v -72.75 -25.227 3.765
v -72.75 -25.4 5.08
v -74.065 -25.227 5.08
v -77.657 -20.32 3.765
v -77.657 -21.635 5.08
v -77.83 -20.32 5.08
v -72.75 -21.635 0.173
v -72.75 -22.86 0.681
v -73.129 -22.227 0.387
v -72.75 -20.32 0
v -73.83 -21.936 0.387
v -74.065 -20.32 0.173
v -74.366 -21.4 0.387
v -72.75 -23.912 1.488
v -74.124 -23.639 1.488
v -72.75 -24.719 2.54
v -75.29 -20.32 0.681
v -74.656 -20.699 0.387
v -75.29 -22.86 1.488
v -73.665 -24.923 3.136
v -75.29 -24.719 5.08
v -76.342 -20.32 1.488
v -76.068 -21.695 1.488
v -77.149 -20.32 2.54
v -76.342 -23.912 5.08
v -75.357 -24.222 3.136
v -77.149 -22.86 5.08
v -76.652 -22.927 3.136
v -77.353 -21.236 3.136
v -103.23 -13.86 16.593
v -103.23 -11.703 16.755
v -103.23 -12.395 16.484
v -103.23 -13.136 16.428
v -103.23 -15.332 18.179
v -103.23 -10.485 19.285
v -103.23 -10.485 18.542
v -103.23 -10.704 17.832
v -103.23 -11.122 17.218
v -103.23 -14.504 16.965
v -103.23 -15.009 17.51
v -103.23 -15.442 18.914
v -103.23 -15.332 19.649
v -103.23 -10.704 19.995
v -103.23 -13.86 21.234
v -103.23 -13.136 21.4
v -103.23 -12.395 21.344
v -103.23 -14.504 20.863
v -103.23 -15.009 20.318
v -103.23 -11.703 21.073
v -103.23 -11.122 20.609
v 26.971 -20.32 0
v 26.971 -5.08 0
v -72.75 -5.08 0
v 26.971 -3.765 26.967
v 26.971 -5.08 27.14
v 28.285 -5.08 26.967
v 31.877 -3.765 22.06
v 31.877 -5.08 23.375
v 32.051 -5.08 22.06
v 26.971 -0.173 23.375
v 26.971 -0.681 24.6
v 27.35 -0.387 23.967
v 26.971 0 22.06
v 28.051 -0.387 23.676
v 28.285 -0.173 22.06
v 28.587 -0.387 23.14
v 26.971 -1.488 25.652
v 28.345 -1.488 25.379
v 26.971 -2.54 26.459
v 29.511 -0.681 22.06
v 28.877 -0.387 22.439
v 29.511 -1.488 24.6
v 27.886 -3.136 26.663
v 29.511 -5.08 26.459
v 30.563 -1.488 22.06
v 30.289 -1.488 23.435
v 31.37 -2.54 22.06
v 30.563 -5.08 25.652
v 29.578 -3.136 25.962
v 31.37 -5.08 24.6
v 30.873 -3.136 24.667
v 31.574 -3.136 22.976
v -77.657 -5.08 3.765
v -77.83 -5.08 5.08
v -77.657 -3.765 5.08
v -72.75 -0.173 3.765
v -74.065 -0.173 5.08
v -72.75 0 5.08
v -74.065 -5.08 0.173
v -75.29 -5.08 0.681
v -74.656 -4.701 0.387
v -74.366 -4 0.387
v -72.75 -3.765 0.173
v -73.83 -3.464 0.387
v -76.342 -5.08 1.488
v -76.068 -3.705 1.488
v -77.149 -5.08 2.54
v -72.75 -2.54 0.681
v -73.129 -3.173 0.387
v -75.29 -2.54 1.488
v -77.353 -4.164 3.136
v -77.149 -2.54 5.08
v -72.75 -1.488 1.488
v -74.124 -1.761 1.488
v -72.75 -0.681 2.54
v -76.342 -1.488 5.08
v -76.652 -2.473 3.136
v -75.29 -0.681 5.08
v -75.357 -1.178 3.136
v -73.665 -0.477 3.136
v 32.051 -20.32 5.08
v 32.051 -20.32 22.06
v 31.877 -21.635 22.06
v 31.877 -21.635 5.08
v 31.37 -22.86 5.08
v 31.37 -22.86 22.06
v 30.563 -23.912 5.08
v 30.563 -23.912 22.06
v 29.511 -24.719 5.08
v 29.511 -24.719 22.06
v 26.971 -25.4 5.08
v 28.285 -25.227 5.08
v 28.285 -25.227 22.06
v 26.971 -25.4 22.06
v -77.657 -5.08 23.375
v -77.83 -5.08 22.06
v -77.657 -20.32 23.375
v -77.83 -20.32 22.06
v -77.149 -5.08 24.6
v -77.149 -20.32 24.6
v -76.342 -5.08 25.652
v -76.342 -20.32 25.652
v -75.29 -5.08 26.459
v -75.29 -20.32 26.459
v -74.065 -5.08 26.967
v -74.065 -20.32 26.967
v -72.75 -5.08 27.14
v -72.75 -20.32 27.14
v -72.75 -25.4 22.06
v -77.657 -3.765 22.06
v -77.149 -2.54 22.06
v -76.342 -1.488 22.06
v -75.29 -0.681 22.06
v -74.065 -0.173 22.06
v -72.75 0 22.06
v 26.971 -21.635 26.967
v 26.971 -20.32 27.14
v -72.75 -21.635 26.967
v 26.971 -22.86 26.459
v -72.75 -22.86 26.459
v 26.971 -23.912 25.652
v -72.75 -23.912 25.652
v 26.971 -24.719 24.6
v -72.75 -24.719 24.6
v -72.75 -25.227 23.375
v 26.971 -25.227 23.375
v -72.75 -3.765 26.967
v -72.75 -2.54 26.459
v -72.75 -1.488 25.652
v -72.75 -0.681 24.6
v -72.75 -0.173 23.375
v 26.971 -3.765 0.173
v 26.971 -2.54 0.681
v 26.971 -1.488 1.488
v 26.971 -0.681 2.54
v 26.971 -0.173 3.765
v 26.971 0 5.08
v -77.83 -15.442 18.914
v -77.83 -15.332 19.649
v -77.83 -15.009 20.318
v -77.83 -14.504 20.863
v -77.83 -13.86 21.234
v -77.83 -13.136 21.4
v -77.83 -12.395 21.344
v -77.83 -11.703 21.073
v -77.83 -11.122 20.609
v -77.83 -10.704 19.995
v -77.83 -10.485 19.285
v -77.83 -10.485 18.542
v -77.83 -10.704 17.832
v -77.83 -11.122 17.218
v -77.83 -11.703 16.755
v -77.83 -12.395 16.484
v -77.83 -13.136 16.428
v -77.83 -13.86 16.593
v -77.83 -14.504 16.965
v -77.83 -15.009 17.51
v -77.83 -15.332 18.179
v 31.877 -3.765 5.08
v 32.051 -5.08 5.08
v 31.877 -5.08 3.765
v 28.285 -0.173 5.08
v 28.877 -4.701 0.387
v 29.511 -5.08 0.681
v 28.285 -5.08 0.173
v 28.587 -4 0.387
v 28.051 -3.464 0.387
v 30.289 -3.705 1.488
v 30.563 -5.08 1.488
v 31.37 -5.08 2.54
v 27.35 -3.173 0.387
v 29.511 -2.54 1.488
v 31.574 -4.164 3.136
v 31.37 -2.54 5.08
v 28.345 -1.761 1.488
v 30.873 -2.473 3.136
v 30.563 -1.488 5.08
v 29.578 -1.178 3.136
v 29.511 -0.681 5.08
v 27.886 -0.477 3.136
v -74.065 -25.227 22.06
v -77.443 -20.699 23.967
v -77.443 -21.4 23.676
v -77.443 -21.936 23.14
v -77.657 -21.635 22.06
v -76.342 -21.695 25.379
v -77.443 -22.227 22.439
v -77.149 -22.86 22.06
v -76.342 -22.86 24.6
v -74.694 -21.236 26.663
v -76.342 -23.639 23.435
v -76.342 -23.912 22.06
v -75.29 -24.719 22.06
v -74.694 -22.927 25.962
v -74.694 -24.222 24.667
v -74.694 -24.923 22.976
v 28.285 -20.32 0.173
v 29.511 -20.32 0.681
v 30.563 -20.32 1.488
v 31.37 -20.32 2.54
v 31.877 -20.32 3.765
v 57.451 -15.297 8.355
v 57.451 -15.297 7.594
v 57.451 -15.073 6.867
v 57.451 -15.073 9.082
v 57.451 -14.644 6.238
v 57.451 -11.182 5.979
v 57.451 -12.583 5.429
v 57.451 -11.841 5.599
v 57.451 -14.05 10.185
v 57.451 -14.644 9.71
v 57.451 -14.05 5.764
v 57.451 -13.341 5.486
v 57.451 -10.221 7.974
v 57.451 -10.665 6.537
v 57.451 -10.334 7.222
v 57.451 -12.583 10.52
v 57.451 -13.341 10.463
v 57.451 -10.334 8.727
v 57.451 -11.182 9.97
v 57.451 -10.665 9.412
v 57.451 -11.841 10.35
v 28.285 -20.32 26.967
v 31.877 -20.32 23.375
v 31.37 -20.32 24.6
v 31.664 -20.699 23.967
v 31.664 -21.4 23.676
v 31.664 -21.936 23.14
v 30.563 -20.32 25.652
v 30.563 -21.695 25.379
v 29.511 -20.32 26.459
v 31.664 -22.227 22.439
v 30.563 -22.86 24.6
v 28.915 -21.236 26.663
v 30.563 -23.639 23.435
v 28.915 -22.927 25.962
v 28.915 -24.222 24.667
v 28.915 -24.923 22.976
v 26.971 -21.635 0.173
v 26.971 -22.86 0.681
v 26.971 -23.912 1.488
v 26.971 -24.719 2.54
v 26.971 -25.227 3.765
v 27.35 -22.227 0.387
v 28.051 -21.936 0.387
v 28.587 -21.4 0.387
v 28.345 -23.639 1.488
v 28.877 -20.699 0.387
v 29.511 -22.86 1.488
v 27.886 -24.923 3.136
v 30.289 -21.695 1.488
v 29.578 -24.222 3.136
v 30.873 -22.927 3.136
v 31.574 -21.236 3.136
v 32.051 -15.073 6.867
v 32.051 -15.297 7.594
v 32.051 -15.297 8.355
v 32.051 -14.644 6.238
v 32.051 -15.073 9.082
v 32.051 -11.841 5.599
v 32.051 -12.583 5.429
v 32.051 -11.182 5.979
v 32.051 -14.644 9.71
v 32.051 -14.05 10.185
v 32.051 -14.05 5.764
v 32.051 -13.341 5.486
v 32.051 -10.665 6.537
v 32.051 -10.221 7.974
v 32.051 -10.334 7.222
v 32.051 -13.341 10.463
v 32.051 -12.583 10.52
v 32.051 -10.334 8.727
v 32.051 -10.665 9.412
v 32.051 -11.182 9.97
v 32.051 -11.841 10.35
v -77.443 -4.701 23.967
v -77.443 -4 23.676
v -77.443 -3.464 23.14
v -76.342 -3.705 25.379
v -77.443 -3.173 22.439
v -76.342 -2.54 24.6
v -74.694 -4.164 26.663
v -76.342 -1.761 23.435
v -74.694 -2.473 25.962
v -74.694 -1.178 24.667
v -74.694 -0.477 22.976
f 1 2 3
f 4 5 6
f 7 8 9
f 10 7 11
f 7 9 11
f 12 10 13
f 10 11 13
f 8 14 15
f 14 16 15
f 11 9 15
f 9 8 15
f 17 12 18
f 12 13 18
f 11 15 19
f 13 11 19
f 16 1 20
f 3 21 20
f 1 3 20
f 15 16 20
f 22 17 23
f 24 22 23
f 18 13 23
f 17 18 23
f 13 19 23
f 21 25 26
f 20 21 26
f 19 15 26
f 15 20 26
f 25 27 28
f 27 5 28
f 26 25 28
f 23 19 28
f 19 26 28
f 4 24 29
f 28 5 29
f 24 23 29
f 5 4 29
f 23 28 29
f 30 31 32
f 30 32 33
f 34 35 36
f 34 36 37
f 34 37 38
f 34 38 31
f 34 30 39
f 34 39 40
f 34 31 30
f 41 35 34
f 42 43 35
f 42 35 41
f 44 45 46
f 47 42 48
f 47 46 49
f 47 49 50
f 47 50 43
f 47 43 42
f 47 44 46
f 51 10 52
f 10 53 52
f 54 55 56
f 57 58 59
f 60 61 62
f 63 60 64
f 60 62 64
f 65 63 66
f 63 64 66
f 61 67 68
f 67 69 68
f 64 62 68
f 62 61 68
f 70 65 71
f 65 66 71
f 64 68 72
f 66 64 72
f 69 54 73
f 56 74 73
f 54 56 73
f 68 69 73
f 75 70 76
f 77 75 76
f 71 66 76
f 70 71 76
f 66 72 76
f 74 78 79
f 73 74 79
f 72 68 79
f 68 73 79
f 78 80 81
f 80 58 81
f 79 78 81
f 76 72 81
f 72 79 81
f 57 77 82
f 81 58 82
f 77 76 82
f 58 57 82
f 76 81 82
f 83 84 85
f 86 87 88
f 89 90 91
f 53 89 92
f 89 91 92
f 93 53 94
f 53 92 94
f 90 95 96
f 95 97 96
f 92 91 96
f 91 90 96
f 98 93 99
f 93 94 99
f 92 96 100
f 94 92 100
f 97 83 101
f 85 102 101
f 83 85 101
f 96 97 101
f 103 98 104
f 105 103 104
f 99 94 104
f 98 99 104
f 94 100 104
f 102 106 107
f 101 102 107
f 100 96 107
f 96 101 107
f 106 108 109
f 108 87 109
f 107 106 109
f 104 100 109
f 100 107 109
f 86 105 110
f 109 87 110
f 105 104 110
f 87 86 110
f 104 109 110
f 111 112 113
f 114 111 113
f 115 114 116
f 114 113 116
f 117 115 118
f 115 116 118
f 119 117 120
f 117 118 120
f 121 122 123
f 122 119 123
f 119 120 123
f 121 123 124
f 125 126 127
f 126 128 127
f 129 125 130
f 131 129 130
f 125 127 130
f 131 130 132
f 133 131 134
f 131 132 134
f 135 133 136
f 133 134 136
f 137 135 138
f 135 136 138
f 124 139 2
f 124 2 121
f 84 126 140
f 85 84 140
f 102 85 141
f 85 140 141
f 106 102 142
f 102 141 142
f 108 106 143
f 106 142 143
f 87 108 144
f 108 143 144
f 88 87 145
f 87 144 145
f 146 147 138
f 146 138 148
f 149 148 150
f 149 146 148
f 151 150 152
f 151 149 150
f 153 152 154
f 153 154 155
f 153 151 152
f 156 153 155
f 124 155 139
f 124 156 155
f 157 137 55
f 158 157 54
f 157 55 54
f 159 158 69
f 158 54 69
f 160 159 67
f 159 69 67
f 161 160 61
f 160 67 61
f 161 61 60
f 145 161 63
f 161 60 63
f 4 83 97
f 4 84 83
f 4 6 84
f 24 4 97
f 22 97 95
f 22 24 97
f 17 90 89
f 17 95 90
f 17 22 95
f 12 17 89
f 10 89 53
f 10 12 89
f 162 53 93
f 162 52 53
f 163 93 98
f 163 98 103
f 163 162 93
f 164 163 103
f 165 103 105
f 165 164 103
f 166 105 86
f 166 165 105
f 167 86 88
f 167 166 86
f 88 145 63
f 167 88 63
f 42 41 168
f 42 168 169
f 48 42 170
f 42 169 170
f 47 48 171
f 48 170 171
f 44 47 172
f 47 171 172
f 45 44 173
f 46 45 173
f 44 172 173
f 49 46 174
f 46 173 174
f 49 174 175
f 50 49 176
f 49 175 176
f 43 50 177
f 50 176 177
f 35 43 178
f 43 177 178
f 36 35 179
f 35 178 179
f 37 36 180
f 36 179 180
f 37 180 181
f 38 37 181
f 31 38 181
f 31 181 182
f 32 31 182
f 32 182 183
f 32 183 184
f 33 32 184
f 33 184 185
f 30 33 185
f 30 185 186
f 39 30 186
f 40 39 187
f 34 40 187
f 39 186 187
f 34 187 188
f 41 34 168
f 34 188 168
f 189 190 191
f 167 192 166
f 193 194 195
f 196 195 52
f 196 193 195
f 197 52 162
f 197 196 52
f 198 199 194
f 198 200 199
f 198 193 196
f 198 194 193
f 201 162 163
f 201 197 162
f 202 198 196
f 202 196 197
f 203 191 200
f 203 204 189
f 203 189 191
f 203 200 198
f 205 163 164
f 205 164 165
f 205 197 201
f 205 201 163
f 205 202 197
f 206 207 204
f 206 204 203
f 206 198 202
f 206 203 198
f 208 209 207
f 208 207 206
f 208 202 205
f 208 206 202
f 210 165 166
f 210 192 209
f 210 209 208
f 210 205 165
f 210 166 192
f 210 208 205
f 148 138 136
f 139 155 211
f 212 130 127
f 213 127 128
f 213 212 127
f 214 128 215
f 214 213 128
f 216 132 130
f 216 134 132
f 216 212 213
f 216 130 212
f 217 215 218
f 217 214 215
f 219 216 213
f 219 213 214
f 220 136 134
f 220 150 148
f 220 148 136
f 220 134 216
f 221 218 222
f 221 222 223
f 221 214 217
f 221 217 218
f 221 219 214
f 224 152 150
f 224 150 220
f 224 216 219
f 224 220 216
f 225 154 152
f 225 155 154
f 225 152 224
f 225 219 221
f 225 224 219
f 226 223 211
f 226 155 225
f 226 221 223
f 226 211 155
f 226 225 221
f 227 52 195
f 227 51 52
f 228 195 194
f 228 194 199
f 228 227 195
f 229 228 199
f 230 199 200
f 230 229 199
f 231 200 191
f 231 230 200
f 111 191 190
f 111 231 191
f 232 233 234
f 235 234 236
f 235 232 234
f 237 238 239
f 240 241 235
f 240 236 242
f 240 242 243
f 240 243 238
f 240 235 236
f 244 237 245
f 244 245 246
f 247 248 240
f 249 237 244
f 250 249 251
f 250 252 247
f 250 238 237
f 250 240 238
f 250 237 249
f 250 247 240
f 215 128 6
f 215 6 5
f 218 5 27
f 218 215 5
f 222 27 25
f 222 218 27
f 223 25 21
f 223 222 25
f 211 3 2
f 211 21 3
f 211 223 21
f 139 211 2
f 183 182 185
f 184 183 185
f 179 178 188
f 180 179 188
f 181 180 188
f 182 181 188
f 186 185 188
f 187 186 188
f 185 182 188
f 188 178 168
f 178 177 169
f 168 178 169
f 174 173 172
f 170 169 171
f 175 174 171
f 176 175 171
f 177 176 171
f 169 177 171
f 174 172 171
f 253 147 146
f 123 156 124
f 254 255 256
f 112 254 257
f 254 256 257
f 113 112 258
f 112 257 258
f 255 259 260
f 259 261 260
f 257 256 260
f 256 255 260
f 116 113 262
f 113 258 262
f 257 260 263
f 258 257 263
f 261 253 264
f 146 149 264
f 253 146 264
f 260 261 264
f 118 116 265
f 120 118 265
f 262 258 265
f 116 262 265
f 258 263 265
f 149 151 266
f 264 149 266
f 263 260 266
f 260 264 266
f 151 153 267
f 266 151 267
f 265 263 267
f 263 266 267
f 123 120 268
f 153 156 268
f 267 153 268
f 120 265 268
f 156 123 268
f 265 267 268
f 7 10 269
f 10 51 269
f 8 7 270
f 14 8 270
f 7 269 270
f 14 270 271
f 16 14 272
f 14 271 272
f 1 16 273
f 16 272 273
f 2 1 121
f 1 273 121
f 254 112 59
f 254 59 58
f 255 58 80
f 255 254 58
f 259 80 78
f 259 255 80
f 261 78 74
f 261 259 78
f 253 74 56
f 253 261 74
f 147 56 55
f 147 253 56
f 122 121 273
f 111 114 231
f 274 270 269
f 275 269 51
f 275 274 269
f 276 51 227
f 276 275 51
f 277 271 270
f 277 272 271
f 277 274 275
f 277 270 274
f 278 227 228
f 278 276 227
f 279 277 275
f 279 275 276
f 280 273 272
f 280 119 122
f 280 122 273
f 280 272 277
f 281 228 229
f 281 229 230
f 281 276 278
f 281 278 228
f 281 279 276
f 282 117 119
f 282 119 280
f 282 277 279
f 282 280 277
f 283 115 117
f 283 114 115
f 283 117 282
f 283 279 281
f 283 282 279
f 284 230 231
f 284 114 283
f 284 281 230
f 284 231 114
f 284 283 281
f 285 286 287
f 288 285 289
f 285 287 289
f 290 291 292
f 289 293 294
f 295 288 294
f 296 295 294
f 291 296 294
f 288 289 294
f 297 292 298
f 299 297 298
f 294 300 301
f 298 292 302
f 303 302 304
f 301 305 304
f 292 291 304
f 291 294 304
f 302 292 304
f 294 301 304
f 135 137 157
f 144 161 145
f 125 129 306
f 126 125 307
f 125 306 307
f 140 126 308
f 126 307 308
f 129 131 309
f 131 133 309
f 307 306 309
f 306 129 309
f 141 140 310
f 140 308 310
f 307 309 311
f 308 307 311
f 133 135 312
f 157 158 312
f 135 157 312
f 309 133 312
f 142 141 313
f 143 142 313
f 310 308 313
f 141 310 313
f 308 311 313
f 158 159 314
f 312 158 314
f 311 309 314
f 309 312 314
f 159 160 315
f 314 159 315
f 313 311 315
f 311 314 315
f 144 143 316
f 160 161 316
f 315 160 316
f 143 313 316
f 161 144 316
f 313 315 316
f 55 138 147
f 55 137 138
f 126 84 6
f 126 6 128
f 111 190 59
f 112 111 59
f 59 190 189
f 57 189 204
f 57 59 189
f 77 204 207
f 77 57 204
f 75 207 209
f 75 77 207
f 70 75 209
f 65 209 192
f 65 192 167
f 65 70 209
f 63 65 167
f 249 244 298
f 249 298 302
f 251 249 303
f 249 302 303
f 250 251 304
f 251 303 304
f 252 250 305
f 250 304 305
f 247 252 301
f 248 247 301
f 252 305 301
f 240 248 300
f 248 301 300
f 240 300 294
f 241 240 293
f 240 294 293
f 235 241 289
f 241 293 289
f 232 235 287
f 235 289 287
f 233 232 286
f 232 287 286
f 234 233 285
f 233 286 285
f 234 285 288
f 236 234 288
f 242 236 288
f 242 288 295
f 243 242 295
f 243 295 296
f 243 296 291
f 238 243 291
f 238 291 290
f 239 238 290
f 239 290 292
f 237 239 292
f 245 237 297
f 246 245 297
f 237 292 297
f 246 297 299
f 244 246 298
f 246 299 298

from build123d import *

# Parameters (mm, degrees)
F0_W     = 109.8804
F0_H     = 27.140012
F1_DEPTH = 25.4
F2_R     = 2.552321
F3_DEPTH = 25.4
F4_R     = 2.492803
F5_DEPTH = 25.4
F6_R     = 5.08


with BuildPart() as f1:
    # F0 (on Front) → F1 (new body)
    with BuildSketch(Plane.XZ):
        with Locations((-22.889608, 13.570006)):
            Rectangle(F0_W, F0_H)
    extrude(amount=F1_DEPTH)

    # F6
    f6_edges = [f1.edges().sort_by_distance(p)[0] for p in [
        (-22.889608, -25.4, 27.140012),
        (32.050592, -12.7, 27.140012),
        (32.050592, -25.4, 13.570006),
        (-22.889608, 0, 27.140012),
        (-77.829808, -12.7, 27.140012),
        (-77.829808, -25.4, 13.570006),
        (-22.889608, -25.4, 0),
        (32.050592, 0, 13.570006),
        (32.050592, -12.7, 0),
        (-77.829808, 0, 13.570006),
        (-77.829808, -12.7, 0),
        (-22.889608, 0, 0),
    ]]
    fillet(f6_edges, radius=F6_R)


with BuildPart() as f3:
    # F2 (on face) → F3 (new body)
    with BuildSketch(Plane.YZ.offset(32.050592)):
        with Locations((-12.77338, 7.974423)):
            Circle(F2_R)
    extrude(amount=F3_DEPTH)


with BuildPart() as f5:
    # F4 (on face) → F5 (new body)
    with BuildSketch(Plane(origin=(-77.829808, 0, 0), x_dir=(0, -1, 0), z_dir=(-1, 0, 0))):
        with Locations((12.9495, 18.913804)):
            Circle(F4_R)
    extrude(amount=F5_DEPTH)


solid = Compound([f1.part, f3.part, f5.part])
